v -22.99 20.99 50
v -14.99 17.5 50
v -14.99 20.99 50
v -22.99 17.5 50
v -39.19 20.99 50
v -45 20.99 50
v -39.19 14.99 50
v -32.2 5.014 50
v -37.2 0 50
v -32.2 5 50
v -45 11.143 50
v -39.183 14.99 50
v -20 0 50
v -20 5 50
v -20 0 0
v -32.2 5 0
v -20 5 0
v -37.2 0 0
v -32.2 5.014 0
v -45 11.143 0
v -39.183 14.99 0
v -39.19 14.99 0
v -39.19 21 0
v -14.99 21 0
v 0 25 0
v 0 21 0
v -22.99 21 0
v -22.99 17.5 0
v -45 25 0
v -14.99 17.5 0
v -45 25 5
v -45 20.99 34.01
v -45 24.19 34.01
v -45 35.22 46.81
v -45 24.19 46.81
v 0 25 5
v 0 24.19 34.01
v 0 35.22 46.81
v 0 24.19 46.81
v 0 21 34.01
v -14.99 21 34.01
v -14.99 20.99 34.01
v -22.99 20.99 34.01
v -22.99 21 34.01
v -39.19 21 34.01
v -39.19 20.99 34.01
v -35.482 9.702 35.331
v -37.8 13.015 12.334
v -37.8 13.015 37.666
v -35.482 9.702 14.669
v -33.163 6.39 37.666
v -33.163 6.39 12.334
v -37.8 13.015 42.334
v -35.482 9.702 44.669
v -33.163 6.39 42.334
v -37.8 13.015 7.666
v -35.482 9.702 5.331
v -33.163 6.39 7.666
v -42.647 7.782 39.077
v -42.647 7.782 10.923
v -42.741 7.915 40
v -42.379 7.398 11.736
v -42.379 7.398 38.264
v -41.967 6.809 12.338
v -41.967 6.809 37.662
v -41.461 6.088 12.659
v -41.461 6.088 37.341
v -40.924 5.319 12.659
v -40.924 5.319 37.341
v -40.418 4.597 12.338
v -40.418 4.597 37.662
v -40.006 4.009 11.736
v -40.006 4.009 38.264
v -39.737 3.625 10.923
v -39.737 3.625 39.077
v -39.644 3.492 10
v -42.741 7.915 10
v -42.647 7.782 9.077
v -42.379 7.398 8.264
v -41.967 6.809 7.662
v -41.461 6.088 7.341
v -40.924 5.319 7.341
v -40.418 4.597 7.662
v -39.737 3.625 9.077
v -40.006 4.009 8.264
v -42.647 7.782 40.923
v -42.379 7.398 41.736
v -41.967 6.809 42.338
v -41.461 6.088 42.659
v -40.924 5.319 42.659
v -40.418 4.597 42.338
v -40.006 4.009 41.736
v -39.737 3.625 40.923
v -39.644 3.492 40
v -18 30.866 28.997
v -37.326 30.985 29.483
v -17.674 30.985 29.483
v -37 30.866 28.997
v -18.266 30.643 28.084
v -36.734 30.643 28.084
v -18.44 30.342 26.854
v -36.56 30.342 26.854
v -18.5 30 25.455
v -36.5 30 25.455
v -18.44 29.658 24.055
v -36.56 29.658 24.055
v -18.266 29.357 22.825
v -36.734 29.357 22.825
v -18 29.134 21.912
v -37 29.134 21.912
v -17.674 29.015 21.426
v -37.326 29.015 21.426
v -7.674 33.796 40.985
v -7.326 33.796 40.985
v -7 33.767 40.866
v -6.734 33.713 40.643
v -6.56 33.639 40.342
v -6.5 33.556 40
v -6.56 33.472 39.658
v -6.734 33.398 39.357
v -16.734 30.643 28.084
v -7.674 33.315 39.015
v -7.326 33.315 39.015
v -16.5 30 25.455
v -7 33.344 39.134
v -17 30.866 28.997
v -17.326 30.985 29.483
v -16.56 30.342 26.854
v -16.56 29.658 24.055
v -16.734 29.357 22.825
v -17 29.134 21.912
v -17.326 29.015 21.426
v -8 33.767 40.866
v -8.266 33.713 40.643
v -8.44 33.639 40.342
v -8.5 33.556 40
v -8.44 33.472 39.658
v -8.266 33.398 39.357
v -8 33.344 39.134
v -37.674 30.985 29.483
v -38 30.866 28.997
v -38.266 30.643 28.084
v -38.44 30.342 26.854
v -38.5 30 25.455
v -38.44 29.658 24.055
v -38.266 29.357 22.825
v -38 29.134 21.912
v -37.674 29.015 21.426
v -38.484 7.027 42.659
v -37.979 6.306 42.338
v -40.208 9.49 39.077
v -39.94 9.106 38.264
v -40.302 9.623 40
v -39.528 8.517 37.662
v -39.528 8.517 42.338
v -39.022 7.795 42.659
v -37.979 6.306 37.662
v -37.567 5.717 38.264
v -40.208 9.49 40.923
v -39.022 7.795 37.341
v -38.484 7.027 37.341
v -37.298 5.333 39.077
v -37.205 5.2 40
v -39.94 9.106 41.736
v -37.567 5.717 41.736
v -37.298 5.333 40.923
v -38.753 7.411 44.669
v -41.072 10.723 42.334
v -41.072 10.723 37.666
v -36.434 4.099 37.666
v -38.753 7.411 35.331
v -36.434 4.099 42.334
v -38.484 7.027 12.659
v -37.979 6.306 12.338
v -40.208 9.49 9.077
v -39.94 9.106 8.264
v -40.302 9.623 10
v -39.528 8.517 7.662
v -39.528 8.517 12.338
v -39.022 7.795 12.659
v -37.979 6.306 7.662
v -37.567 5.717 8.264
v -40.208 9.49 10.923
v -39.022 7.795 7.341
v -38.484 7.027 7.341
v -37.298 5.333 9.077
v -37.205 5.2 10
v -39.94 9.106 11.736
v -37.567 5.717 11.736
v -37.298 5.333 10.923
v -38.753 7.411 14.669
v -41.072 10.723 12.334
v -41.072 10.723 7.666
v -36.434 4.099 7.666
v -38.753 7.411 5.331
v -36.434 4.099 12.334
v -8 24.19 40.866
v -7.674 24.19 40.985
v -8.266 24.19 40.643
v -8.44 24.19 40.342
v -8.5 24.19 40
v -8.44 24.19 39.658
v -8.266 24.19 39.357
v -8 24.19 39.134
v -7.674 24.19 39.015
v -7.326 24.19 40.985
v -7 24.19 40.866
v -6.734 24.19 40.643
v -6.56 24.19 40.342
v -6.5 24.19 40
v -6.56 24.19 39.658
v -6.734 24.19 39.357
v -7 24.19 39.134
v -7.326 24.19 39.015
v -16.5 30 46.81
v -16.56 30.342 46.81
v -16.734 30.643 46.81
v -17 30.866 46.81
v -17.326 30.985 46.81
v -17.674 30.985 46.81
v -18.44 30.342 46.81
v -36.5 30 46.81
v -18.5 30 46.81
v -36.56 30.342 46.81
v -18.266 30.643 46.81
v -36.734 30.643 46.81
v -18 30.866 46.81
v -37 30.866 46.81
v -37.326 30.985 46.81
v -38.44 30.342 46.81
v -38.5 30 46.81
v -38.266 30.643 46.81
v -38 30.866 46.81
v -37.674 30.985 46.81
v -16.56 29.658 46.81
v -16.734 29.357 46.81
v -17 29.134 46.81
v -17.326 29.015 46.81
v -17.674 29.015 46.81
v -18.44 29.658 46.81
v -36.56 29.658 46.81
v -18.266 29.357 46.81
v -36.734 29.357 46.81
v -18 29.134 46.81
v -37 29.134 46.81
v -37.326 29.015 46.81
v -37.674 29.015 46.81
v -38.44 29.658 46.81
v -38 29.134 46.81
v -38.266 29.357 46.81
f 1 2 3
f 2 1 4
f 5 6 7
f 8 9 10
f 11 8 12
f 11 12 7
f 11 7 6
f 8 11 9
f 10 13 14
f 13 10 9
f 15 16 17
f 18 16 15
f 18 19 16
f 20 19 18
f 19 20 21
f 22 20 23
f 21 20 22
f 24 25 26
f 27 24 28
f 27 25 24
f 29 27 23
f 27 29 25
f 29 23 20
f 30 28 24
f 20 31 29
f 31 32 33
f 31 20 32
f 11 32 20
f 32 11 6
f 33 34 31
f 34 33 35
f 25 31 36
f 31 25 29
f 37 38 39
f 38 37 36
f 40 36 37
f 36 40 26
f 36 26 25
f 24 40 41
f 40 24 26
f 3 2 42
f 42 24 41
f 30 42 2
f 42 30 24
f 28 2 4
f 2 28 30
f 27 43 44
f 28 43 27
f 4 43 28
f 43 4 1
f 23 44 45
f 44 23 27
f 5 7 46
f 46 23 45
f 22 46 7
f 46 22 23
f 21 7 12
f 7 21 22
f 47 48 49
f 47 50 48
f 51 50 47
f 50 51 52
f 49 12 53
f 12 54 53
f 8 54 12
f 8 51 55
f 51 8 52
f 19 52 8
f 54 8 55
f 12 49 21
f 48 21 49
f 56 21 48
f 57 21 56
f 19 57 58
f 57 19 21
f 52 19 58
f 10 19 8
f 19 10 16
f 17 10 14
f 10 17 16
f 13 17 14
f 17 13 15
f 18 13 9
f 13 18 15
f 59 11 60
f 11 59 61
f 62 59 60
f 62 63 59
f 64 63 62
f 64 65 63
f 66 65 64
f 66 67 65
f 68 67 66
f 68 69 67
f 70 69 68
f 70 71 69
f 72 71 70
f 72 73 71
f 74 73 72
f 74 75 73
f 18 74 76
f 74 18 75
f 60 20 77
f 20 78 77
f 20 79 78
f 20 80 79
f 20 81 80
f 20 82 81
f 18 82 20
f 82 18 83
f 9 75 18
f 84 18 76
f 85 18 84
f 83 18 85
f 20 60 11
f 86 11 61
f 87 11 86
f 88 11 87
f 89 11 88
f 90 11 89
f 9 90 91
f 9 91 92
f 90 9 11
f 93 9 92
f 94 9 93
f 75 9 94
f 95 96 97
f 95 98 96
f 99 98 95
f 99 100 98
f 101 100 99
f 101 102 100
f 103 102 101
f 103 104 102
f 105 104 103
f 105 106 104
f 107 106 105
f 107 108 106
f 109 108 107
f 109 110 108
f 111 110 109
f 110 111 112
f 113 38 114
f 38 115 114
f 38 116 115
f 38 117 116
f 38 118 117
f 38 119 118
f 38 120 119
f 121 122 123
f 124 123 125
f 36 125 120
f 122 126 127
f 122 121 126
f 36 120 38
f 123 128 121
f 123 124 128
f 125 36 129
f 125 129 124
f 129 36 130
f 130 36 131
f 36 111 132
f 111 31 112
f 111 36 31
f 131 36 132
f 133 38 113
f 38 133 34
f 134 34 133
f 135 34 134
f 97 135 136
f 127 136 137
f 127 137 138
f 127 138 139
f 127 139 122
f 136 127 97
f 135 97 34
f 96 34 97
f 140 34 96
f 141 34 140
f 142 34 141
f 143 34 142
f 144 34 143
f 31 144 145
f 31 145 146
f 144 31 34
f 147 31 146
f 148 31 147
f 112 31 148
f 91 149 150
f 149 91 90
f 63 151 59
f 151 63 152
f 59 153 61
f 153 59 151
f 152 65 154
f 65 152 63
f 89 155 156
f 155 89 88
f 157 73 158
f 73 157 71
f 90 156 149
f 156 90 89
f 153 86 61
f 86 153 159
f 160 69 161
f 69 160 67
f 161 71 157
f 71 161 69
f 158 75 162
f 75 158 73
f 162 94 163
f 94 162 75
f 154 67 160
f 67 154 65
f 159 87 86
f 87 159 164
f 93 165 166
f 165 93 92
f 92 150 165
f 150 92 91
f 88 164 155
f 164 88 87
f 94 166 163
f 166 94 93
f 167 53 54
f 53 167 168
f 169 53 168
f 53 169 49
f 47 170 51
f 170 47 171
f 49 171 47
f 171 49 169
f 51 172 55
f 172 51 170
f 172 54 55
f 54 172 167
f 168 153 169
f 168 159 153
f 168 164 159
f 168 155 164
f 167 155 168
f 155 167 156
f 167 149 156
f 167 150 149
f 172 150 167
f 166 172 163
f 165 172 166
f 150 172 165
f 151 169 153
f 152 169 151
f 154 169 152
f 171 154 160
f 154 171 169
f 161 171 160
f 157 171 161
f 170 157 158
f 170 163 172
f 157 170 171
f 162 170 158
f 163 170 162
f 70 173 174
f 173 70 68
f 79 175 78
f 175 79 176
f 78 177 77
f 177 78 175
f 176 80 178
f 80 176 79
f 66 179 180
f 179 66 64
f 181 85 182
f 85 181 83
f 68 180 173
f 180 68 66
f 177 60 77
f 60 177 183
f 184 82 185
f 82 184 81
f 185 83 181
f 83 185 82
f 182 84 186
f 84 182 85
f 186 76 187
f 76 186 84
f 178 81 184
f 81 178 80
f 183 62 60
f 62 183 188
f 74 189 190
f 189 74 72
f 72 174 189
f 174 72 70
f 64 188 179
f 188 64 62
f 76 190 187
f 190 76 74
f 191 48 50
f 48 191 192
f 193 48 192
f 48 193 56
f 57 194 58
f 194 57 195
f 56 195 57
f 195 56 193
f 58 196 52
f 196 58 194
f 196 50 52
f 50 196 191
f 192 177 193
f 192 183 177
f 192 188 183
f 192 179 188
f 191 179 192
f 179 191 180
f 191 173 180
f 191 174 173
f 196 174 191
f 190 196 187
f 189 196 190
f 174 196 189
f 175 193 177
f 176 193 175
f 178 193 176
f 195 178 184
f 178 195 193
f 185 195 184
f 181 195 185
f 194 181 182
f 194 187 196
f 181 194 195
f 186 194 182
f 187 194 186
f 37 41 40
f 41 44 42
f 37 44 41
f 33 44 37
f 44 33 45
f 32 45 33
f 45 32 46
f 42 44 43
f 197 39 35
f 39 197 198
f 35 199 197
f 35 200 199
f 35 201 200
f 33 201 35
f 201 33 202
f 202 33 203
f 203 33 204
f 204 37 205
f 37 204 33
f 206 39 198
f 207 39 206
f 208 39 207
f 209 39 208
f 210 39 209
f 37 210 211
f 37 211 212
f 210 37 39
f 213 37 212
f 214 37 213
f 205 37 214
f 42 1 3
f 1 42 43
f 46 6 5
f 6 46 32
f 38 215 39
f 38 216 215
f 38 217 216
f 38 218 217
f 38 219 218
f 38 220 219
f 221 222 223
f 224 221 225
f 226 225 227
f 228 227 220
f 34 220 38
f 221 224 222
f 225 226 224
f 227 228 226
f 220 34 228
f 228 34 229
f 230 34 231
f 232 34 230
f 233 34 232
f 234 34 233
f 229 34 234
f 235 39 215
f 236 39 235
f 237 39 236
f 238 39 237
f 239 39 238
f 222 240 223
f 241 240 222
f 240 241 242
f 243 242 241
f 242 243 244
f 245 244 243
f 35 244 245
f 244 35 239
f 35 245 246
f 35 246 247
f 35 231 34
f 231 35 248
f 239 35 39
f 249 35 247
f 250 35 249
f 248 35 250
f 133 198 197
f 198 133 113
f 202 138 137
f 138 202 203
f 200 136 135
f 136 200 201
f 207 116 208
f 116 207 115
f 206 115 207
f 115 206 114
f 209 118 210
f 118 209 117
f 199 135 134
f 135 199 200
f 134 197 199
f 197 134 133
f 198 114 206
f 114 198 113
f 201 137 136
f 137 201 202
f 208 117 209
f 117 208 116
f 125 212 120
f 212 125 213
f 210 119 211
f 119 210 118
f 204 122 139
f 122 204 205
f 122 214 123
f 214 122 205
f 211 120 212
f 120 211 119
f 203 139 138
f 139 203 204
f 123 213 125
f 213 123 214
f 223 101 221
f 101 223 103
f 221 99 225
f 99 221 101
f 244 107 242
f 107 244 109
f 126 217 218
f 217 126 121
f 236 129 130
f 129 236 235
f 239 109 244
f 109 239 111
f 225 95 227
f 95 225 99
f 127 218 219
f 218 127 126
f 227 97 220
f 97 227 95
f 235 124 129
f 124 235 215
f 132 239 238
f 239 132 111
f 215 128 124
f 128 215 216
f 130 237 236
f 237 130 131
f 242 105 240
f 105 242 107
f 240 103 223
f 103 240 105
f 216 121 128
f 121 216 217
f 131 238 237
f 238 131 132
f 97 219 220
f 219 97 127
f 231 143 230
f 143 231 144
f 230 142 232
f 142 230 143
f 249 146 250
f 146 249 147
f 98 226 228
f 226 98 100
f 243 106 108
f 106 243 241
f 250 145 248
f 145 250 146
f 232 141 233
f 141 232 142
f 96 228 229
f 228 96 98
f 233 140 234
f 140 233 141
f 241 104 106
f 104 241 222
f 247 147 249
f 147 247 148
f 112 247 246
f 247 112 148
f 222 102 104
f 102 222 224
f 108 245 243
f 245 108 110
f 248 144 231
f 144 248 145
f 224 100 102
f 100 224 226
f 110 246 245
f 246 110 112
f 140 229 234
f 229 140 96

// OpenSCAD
$fn = 18;

module bandsaw_shape()
{
	difference()
	{
		union()
		{
			square([45, 25]);
		}
		square([20, 10]);
		translate([-0.01, 5]) union()
		{
			square([15,16]);
			translate([15-0.01,0]) square([8+0.02, 16-3.5]);
			translate([23,0]) square([9.2+0.01, 16]);
			translate([32.2,10-0.01]) square([7, 6.01]);
			translate([32.2,0])polygon([[0,0], [0,10], [7,10]]);
		}
		translate([37.2,0])polygon([[0,0], [14,0], [14,20]]);
	}
}

module wedge()
{
	polygon([[0,0], [0,11], [45,0]]);
}

module bandsaw_guide()
{
	difference()
	{
		union()
		{
			linear_extrude(height=50) bandsaw_shape();
			translate([45,25,0]) rotate([0,-90,0]) linear_extrude(height=45) wedge();
		}
		translate([32.2,12,10]) 
			rotate([90,0,55]) 
				union()
				{
					cylinder(r=2.7, h=30);
					rotate([0,0,30]) cylinder(r=8 / 2 / cos(180 / 6) + 0.05, , h=8, $fn=6);
				}
		translate([32.2,12,40]) 
			rotate([90,0,55]) 
				union()
				{
					cylinder(r=2.7, h=30);
					rotate([0,0,30]) cylinder(r=8 / 2 / cos(180 / 6) + 0.05, , h=8, $fn=6);
				}
	}
}

module l_channel(len=300)
{
	union()
	{
		cube([16, 3.2, len]);
		cube([3.2, 16, len]);
	}
}

translate([0,0,50]) rotate([0,180,0]) 
difference()
{
	union()
	{
		bandsaw_guide();
	}	
	translate([50,20.99,-0.01]) rotate([0,-90,0]) l_channel(60);
	translate([7.5,-0.01, 10]) rotate([-90,0,0]) cylinder(r=1, h=60);
	translate([17.5, 30, -0.01]) cylinder(r=1, h=60);
	translate([37.5, 30, -0.01]) cylinder(r=1, h=60);
}
